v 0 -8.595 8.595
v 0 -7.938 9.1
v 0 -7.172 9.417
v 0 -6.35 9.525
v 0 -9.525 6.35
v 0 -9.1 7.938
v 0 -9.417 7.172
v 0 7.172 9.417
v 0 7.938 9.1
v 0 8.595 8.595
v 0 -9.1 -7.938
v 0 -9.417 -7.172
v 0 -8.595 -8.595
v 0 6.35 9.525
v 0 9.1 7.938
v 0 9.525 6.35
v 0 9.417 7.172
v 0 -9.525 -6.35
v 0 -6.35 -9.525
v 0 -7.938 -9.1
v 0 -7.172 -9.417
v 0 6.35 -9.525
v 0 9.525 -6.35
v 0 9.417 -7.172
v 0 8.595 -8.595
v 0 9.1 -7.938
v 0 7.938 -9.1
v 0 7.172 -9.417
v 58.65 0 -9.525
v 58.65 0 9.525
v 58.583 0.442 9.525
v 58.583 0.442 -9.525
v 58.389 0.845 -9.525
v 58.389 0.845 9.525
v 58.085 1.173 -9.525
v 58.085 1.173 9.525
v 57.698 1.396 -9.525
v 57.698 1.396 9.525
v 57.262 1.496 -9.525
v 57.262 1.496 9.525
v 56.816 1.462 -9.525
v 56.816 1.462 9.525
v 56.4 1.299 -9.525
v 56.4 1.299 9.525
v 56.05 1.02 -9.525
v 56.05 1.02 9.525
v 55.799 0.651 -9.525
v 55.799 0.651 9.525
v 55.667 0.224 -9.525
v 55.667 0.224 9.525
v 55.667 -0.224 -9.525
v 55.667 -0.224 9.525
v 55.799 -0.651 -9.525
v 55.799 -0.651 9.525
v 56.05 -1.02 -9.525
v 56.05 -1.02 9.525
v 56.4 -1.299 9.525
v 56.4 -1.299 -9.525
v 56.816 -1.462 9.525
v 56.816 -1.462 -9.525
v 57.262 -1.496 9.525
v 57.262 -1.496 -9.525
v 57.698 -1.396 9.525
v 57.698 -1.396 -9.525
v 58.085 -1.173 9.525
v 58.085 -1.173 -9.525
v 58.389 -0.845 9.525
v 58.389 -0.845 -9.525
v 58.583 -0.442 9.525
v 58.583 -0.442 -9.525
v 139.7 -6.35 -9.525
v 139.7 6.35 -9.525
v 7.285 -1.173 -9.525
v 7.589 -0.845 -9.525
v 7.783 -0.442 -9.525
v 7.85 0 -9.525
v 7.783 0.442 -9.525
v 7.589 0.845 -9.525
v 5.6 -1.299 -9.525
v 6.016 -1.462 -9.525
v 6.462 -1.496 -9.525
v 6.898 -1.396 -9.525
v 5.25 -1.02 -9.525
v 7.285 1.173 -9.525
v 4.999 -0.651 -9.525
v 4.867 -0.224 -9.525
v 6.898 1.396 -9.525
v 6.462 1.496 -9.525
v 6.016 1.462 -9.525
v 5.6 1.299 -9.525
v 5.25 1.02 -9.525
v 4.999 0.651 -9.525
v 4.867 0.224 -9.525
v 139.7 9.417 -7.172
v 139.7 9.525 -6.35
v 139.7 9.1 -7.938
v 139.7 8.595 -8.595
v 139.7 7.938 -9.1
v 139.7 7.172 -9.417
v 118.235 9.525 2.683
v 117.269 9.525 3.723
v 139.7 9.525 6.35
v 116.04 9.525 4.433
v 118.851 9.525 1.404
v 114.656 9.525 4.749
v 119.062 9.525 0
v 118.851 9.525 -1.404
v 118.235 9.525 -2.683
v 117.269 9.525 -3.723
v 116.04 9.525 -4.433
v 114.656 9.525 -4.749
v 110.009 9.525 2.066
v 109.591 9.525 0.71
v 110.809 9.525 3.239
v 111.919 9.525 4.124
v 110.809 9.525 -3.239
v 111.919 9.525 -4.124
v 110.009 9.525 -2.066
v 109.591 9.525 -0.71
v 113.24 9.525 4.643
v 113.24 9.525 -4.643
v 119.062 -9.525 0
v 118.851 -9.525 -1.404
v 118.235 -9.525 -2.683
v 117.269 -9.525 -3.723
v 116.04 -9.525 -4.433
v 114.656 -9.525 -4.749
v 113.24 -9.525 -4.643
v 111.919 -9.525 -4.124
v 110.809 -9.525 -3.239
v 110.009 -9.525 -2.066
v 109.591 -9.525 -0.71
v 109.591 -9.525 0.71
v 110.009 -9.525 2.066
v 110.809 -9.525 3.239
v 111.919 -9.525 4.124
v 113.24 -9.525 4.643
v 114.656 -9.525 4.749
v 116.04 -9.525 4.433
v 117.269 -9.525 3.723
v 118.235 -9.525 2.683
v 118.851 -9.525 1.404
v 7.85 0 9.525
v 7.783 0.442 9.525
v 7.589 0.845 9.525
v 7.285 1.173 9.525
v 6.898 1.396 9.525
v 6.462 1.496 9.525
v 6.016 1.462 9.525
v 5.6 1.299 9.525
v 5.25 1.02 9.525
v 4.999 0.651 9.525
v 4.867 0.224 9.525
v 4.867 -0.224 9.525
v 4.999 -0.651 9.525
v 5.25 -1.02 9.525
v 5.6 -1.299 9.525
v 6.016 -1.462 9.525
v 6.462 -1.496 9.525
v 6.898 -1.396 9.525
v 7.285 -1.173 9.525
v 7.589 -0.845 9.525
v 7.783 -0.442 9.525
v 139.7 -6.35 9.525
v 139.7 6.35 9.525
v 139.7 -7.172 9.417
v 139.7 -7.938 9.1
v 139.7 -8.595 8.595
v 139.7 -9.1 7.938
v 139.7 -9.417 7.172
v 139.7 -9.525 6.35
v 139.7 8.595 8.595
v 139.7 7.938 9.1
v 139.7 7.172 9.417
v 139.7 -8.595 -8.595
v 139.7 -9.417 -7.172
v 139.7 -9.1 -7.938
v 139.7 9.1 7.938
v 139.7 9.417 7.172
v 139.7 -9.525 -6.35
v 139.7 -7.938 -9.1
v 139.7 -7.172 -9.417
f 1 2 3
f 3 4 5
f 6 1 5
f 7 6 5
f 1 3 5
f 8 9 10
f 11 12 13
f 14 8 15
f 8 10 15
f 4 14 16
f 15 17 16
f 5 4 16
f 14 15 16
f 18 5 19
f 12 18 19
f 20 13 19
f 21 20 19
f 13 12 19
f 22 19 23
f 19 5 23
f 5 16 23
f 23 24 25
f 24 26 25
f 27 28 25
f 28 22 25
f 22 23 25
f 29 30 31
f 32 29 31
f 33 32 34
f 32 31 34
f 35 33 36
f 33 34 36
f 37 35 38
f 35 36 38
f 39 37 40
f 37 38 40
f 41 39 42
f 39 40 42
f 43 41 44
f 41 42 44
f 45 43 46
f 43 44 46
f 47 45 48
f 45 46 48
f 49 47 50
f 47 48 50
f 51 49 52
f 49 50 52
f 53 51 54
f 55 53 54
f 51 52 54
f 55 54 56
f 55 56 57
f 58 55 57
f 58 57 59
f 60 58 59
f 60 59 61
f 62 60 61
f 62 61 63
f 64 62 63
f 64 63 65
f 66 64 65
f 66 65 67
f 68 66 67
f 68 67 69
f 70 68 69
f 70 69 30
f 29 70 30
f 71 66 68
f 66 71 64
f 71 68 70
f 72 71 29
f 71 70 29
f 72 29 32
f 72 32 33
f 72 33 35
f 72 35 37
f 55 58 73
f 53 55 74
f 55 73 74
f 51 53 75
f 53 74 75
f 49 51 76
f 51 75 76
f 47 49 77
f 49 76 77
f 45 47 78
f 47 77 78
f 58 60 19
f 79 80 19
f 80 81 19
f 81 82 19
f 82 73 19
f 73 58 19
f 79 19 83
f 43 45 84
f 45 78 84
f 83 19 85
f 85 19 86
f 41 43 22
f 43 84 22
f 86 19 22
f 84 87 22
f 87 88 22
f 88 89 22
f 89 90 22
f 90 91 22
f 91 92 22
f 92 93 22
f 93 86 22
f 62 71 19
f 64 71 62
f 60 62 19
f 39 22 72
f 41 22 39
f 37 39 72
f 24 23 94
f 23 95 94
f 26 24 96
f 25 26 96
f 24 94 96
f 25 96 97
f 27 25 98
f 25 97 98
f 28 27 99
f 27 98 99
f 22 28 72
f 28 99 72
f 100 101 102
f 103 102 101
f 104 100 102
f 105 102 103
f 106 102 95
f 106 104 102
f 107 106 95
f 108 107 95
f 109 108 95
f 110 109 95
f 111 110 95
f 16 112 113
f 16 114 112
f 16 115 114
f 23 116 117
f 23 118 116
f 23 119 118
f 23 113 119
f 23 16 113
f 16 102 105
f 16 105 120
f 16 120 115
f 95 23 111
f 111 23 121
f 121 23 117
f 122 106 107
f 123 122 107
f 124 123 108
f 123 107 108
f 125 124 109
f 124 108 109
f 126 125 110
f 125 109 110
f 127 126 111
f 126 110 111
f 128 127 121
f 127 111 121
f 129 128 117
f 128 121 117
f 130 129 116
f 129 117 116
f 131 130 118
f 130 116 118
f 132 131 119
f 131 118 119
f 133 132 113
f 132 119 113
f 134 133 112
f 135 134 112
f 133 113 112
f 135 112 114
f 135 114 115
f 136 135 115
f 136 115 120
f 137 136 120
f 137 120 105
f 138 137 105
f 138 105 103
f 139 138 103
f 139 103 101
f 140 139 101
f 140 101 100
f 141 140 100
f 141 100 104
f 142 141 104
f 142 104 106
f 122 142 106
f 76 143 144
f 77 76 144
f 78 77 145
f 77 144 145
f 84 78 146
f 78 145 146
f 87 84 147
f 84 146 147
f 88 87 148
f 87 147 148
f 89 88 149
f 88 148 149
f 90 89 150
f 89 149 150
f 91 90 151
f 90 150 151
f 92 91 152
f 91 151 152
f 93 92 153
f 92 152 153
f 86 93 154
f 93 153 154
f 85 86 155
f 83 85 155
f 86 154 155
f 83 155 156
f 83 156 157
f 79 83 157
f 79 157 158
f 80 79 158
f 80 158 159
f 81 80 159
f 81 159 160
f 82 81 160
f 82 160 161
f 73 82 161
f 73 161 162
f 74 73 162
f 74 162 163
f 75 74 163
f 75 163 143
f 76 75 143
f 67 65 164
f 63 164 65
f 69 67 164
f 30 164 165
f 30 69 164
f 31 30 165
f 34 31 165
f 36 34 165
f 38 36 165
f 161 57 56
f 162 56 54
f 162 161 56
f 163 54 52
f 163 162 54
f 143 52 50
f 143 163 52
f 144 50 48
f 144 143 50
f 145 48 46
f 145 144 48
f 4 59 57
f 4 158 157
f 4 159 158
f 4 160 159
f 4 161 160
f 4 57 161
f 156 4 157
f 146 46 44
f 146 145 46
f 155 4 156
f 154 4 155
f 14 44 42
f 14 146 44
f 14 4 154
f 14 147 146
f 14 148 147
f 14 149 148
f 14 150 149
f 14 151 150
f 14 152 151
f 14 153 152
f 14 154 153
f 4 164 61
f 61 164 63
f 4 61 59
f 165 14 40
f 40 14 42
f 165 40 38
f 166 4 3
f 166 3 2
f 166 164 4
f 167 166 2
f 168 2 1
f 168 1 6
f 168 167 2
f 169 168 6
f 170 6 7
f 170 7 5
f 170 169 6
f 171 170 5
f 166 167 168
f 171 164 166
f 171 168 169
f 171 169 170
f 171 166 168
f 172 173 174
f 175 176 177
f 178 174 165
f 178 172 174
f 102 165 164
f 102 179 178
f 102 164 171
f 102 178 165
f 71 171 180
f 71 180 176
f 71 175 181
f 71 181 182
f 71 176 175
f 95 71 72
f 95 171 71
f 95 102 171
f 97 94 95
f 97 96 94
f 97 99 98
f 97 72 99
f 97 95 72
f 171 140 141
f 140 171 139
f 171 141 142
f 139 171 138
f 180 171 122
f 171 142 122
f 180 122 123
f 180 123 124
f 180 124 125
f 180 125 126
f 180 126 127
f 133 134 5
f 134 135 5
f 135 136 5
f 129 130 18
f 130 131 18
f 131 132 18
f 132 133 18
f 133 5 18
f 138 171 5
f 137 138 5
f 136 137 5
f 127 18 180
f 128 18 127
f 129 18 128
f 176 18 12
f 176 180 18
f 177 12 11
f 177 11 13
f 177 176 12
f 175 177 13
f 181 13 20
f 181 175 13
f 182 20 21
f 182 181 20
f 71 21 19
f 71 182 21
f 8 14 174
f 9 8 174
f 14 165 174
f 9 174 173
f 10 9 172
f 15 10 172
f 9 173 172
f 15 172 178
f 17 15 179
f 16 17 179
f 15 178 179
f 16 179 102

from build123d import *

# Parameters (mm, degrees)
SKETCH1_W           = 19.05
SKETCH1_H           = 19.05
BOSS_EXTRUDE1_DEPTH = 139.7
SKETCH2_R           = 4.7625
CUT_EXTRUDE1_DEPTH  = 20.05
SKETCH3_R           = 1.5
CUT_EXTRUDE2_DEPTH  = 20.05
FILLET1_R           = 3.175


with BuildPart() as part:
    # Sketch1 → Boss-Extrude1 (new body)
    with BuildSketch(Plane(origin=(0, 0, 0), x_dir=(0, 0, -1), z_dir=(1, 0, 0))):
        Rectangle(SKETCH1_W, SKETCH1_H)
    extrude(amount=BOSS_EXTRUDE1_DEPTH)

    # Sketch2 → Cut-Extrude1 (cut, through all)
    with BuildSketch(Plane(origin=(0, 9.525, 0), x_dir=(1, 0, 0), z_dir=(0, 1, 0))):
        with Locations((114.3, 0)):
            Circle(SKETCH2_R)
    extrude(amount=-CUT_EXTRUDE1_DEPTH, mode=Mode.SUBTRACT)

    # Sketch3 → Cut-Extrude2 (cut, through all)
    with BuildSketch(Plane.XY.offset(9.525)):
        with Locations((6.35, 0)):
            Circle(SKETCH3_R)
        with Locations((57.15, 0)):
            Circle(SKETCH3_R)
    extrude(amount=-CUT_EXTRUDE2_DEPTH, mode=Mode.SUBTRACT)

    # Fillet1
    fillet1_edges = [part.edges().sort_by_distance(p)[0] for p in [
        (69.85, -9.525, 9.525),
        (69.85, 9.525, 9.525),
        (69.85, 9.525, -9.525),
        (69.85, -9.525, -9.525),
    ]]
    fillet(fillet1_edges, radius=FILLET1_R)


solid = part.part
